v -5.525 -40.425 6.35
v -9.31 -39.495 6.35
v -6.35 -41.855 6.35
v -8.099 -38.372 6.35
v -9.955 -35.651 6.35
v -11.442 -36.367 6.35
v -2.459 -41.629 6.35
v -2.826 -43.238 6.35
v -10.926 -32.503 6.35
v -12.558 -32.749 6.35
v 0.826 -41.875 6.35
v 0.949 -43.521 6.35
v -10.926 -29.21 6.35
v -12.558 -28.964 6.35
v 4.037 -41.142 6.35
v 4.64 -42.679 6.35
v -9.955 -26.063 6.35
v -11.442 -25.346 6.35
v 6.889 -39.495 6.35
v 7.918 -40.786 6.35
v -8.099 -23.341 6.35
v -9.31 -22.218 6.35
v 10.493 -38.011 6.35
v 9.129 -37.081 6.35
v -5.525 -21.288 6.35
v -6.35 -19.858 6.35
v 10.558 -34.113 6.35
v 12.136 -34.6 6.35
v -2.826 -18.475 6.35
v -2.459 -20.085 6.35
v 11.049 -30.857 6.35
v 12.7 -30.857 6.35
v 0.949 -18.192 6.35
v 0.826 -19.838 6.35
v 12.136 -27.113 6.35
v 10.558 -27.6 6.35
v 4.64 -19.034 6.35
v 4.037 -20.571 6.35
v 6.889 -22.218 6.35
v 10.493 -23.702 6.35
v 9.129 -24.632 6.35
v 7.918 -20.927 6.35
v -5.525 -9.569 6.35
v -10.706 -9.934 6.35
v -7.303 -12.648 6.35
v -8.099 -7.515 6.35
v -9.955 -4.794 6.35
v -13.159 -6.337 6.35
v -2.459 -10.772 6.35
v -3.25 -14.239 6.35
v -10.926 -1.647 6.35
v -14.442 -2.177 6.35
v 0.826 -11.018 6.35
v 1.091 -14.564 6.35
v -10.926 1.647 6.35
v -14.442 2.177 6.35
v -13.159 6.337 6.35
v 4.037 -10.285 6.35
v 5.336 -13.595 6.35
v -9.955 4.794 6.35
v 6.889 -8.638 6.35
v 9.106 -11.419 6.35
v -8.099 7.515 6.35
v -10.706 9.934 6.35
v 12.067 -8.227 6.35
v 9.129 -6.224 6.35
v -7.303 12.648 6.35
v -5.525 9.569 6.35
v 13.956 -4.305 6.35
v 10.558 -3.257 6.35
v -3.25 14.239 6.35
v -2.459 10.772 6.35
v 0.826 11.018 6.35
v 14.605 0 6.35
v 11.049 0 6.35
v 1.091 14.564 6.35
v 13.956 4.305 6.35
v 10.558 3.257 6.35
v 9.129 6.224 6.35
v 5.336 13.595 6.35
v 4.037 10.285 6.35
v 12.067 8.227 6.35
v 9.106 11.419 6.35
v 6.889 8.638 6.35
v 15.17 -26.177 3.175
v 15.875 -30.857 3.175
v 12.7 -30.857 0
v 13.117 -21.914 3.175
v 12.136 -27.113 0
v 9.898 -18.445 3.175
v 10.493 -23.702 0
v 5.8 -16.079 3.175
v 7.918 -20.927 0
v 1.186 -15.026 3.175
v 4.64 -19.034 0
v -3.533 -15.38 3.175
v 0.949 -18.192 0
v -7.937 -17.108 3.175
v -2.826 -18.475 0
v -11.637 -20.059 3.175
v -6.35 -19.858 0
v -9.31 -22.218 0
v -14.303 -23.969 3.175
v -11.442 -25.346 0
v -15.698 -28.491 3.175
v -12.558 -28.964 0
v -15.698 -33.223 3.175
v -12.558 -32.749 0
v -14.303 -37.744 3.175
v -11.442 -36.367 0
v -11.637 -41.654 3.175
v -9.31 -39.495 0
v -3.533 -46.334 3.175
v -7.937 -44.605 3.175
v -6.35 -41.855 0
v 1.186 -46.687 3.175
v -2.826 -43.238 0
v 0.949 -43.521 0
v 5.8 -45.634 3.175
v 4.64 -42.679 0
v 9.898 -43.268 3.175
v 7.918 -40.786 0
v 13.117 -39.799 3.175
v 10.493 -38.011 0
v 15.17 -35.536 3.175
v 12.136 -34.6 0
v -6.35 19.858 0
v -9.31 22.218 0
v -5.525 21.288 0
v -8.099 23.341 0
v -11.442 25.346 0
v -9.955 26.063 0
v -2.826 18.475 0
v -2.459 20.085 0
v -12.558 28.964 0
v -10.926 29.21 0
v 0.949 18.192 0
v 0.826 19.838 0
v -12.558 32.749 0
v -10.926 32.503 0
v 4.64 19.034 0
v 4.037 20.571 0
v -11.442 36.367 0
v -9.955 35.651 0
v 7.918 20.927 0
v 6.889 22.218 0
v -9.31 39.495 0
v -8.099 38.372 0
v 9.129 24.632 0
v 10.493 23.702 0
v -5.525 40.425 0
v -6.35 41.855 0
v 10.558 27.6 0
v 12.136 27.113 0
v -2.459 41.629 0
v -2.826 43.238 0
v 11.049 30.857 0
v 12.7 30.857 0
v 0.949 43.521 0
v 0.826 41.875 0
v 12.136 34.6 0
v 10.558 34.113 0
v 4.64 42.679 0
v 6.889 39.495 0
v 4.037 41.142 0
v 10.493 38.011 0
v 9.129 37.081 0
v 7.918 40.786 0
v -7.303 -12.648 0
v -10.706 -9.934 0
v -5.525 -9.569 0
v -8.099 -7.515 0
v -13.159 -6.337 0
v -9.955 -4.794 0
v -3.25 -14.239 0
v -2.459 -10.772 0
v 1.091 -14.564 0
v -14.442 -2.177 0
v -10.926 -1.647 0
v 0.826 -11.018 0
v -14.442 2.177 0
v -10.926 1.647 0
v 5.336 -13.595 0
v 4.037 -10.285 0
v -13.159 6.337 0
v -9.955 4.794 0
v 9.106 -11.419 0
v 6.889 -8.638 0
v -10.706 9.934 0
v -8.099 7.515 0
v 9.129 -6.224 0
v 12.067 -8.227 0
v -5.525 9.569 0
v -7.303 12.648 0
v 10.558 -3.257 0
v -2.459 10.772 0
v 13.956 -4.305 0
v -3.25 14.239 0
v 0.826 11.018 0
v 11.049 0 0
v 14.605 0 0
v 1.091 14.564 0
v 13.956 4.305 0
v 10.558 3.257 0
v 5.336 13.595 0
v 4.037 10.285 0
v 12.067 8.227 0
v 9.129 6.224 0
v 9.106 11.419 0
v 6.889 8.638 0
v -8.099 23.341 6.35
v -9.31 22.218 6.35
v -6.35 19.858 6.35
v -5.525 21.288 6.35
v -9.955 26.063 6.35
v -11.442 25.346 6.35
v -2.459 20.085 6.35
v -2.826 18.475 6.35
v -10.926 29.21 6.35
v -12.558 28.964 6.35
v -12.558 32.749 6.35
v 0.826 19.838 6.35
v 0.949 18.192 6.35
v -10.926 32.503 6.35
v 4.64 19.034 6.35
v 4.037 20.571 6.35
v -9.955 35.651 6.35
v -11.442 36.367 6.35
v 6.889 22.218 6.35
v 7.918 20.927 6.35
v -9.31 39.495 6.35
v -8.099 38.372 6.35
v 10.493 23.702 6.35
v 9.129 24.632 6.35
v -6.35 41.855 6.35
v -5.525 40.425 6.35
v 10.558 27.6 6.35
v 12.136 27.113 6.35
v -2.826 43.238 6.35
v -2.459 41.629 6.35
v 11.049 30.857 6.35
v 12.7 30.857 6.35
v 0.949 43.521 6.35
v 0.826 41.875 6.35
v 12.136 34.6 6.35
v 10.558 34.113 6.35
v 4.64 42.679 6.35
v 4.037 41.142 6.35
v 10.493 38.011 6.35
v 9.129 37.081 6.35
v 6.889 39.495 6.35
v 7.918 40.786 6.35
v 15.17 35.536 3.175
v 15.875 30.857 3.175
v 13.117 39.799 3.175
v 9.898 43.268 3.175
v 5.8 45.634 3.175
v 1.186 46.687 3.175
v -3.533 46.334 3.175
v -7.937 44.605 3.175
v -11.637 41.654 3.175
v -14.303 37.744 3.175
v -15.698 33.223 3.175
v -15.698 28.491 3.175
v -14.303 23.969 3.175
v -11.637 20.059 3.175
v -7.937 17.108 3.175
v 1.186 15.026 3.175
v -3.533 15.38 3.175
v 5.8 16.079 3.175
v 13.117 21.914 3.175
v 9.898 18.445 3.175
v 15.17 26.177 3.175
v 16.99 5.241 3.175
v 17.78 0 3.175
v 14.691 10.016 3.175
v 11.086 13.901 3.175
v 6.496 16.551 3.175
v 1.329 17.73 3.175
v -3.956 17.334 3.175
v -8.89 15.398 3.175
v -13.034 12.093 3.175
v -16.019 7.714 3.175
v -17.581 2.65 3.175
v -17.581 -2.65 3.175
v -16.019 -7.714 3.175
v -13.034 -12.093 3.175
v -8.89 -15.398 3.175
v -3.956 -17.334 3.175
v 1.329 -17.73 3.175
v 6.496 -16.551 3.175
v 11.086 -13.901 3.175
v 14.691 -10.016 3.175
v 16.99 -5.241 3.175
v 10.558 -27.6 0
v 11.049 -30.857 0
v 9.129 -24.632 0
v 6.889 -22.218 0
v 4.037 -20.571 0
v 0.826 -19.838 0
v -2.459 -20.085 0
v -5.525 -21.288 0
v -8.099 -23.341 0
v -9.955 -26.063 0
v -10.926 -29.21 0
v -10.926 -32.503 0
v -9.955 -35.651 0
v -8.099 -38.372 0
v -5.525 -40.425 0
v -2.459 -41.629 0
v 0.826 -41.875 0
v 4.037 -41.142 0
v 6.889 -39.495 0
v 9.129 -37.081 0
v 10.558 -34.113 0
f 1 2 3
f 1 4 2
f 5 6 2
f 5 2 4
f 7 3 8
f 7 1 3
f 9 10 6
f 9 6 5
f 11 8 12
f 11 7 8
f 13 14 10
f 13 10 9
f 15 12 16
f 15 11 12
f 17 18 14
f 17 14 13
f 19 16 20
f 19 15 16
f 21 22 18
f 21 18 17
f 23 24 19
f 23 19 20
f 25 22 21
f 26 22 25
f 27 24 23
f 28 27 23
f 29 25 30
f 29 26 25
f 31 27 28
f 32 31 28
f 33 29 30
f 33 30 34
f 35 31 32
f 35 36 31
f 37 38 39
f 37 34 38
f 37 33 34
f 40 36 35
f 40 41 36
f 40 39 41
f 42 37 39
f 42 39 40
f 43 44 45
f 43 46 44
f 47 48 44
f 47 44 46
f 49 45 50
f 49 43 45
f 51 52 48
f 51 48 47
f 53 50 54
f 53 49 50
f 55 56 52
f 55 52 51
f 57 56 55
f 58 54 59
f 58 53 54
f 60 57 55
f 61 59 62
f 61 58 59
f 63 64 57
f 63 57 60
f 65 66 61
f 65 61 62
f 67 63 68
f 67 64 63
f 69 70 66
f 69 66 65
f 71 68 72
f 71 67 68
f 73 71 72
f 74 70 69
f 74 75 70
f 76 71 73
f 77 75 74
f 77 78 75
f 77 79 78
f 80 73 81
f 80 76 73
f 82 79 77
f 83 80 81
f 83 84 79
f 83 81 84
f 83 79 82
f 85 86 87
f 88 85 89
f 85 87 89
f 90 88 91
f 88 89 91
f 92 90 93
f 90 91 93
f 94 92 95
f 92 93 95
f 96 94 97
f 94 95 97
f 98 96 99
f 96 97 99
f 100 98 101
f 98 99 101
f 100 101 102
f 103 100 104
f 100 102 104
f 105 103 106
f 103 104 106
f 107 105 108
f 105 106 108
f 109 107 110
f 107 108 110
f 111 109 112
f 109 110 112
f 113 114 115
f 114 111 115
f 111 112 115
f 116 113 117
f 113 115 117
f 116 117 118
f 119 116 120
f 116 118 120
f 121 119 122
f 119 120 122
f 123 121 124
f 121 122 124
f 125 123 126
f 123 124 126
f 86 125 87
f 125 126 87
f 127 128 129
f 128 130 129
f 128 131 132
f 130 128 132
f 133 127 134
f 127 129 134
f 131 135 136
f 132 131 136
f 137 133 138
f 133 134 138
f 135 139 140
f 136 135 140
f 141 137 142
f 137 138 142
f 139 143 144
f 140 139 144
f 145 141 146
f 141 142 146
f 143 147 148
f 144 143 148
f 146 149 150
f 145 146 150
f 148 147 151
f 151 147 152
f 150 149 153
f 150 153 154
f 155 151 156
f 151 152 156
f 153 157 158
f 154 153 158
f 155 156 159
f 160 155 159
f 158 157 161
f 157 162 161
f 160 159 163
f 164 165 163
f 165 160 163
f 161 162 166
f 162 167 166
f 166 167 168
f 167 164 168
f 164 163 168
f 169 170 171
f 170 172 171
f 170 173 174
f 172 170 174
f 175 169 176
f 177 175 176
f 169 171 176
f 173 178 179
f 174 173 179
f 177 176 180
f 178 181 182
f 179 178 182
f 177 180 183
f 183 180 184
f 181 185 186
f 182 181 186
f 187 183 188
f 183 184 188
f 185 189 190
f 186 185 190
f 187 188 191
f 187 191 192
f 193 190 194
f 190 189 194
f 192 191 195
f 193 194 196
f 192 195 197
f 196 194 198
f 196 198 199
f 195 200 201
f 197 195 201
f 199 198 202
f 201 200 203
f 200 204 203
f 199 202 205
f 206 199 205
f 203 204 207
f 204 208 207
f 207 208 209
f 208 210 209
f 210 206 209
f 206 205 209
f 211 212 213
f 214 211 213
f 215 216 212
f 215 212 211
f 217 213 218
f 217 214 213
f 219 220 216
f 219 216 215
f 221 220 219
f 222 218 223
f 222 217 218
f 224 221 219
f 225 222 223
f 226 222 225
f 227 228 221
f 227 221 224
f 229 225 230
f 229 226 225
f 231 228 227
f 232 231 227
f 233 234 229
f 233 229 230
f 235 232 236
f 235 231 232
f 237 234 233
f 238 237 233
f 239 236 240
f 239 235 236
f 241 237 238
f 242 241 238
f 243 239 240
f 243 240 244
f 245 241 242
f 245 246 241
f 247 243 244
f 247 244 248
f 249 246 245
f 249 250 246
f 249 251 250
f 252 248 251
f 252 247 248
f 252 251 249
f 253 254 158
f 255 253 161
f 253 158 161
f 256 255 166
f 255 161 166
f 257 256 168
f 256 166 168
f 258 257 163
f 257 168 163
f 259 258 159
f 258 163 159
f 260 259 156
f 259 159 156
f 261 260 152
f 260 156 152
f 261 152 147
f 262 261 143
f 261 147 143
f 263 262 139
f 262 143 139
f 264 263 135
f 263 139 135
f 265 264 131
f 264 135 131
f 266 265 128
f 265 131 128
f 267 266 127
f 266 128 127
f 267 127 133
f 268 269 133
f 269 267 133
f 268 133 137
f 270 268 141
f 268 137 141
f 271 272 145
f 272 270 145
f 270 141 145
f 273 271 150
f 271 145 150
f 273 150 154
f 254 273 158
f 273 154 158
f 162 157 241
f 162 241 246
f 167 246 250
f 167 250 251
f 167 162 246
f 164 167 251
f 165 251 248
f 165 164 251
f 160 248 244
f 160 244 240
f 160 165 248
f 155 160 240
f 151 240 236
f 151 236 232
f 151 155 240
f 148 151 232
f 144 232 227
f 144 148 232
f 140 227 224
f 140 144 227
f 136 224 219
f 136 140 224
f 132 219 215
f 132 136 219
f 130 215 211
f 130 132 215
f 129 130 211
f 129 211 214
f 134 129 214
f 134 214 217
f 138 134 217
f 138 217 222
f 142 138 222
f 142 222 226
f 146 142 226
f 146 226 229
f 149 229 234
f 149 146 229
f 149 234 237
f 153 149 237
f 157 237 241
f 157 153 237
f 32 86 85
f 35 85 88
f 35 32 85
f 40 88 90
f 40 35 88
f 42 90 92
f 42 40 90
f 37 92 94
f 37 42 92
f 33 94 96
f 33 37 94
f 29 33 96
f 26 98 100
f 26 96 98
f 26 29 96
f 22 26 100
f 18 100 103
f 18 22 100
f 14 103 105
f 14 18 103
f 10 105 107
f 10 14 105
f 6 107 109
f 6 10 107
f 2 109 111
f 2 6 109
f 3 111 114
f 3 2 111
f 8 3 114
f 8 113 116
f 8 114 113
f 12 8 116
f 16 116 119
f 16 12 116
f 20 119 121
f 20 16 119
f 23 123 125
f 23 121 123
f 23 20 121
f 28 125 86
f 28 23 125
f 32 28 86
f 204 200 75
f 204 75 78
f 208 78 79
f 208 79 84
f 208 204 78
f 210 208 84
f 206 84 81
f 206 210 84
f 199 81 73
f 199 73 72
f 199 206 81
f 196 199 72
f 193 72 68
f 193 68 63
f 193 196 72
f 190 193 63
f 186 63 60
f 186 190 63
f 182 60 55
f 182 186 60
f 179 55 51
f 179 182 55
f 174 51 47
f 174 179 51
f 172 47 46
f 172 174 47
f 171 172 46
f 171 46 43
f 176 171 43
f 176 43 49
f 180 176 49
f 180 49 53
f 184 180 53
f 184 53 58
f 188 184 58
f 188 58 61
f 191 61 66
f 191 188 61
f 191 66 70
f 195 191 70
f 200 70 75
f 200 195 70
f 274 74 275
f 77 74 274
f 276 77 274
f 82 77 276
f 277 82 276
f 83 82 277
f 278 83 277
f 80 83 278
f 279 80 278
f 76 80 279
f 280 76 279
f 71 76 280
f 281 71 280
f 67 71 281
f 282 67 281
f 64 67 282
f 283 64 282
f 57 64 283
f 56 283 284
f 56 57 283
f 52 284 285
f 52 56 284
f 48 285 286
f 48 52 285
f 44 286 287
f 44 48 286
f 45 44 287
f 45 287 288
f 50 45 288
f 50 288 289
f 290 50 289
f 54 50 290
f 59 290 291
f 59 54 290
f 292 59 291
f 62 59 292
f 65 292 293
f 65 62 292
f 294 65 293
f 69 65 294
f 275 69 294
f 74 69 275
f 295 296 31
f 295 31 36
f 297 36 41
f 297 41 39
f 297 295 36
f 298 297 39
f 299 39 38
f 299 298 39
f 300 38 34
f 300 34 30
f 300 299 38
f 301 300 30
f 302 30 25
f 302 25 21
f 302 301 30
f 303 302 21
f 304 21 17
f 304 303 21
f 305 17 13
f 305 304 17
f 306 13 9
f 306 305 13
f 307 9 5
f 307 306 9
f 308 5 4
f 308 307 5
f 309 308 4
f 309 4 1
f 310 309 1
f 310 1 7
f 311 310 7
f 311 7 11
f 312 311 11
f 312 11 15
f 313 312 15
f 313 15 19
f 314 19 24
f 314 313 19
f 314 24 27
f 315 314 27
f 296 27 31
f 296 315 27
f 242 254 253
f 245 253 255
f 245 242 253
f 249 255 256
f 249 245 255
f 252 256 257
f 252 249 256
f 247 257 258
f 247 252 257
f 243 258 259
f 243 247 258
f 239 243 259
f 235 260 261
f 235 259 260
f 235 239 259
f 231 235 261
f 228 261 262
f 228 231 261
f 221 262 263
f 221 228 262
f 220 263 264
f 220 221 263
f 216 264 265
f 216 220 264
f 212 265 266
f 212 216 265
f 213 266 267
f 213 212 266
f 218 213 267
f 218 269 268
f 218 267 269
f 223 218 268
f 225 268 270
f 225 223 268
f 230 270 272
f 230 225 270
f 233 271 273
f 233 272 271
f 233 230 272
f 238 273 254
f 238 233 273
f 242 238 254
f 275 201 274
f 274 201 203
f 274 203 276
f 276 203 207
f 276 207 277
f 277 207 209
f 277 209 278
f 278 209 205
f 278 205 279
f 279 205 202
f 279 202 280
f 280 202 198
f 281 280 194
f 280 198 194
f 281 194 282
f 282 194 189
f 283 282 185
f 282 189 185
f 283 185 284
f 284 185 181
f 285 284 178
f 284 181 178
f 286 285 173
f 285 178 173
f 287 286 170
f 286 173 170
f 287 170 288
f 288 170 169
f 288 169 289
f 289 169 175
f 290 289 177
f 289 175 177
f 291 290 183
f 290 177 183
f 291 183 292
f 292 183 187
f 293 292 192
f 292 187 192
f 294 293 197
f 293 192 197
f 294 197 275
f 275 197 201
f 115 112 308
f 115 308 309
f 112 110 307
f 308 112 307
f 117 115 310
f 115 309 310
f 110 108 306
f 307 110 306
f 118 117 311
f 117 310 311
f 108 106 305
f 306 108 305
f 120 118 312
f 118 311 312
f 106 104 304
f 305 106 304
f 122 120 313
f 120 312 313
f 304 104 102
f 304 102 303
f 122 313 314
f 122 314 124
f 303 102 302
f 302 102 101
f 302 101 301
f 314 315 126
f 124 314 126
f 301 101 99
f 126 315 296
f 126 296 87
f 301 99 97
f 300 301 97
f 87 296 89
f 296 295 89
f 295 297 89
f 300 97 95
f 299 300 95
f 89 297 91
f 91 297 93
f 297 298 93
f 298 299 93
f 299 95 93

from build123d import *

# Parameters (mm, degrees)
F1_R      = 17.78
F1_R_2    = 11.049
F3_DEPTH  = 6.35
F2_R      = 19.685
F2_R_2    = 11.049
F0_R      = 17.78
F0_R_2    = 11.049
F4_SIZE   = 5.08
F4_2_SIZE = 5.08
F4_3_SIZE = 5.08


# Not quite as in the source:
# - a fillet or chamfer that OpenCascade refuses, or shapes differently, is made with other operations: its cross-section is extruded or revolved along the edge and cut away or added


with BuildPart() as f3:
    # F1 (on Top) → F3 (new body)
    with BuildSketch(Plane.XY):
        with Locations((0, 30.8565702289)):
            Circle(F1_R)
        with Locations((0, 30.8565702289)):
            Circle(F1_R_2, mode=Mode.SUBTRACT)
    extrude(amount=F3_DEPTH)

    # F4
    f4_edges = [f3.edges().sort_by_distance(p)[0] for p in [
        (-17.78, 30.85657, 0),
    ]]
    chamfer(f4_edges, length=F4_SIZE)

    # F5: chamfer of 5.08 on 1 edges, made by hand

    # F5_s1 → F5_t2 (revolve, cut)
    with BuildSketch(Plane.XZ.offset(-30.8565702289)):
        Polygon((17.78, 1.27), (12.7, 6.35), (17.78, 6.35), align=None)
    revolve(axis=Axis((0, 30.8565702289, 6.35), (0, 0, 1)), mode=Mode.SUBTRACT)


with BuildPart() as f3b:
    # F2 (on Top) → F3, piece 2 (new body)
    with BuildSketch(Plane.XY):
        Circle(F2_R)
        Circle(F2_R_2, mode=Mode.SUBTRACT)
    extrude(amount=F3_DEPTH)

    # F4#2
    f4_2_edges = [f3b.edges().sort_by_distance(p)[0] for p in [
        (-19.685, 0, 0),
    ]]
    chamfer(f4_2_edges, length=F4_2_SIZE)

    # F5#2: chamfer of 5.08 on 1 edges, made by hand

    # F5_2_s1 → F5_2_t2 (revolve, cut)
    with BuildSketch(Plane.XZ):
        Polygon((19.685, 1.27), (14.605, 6.35), (19.685, 6.35), align=None)
    revolve(axis=Axis((0, 0, 6.35), (0, 0, 1)), mode=Mode.SUBTRACT)


with BuildPart() as f3c:
    # F0 (on Top) → F3, piece 3 (new body)
    with BuildSketch(Plane.XY):
        with Locations((0, -30.8565702289)):
            Circle(F0_R)
        with Locations((0, -30.8565702289)):
            Circle(F0_R_2, mode=Mode.SUBTRACT)
    extrude(amount=F3_DEPTH)

    # F4#3
    f4_3_edges = [f3c.edges().sort_by_distance(p)[0] for p in [
        (-17.78, -30.85657, 0),
    ]]
    chamfer(f4_3_edges, length=F4_3_SIZE)

    # F5#3: chamfer of 5.08 on 1 edges, made by hand

    # F5_3_s1 → F5_3_t2 (revolve, cut)
    with BuildSketch(Plane.XZ.offset(30.8565702289)):
        Polygon((17.78, 1.27), (12.7, 6.35), (17.78, 6.35), align=None)
    revolve(axis=Axis((0, -30.8565702289, 6.35), (0, 0, 1)), mode=Mode.SUBTRACT)


solid = Compound([f3.part, f3b.part, f3c.part])
